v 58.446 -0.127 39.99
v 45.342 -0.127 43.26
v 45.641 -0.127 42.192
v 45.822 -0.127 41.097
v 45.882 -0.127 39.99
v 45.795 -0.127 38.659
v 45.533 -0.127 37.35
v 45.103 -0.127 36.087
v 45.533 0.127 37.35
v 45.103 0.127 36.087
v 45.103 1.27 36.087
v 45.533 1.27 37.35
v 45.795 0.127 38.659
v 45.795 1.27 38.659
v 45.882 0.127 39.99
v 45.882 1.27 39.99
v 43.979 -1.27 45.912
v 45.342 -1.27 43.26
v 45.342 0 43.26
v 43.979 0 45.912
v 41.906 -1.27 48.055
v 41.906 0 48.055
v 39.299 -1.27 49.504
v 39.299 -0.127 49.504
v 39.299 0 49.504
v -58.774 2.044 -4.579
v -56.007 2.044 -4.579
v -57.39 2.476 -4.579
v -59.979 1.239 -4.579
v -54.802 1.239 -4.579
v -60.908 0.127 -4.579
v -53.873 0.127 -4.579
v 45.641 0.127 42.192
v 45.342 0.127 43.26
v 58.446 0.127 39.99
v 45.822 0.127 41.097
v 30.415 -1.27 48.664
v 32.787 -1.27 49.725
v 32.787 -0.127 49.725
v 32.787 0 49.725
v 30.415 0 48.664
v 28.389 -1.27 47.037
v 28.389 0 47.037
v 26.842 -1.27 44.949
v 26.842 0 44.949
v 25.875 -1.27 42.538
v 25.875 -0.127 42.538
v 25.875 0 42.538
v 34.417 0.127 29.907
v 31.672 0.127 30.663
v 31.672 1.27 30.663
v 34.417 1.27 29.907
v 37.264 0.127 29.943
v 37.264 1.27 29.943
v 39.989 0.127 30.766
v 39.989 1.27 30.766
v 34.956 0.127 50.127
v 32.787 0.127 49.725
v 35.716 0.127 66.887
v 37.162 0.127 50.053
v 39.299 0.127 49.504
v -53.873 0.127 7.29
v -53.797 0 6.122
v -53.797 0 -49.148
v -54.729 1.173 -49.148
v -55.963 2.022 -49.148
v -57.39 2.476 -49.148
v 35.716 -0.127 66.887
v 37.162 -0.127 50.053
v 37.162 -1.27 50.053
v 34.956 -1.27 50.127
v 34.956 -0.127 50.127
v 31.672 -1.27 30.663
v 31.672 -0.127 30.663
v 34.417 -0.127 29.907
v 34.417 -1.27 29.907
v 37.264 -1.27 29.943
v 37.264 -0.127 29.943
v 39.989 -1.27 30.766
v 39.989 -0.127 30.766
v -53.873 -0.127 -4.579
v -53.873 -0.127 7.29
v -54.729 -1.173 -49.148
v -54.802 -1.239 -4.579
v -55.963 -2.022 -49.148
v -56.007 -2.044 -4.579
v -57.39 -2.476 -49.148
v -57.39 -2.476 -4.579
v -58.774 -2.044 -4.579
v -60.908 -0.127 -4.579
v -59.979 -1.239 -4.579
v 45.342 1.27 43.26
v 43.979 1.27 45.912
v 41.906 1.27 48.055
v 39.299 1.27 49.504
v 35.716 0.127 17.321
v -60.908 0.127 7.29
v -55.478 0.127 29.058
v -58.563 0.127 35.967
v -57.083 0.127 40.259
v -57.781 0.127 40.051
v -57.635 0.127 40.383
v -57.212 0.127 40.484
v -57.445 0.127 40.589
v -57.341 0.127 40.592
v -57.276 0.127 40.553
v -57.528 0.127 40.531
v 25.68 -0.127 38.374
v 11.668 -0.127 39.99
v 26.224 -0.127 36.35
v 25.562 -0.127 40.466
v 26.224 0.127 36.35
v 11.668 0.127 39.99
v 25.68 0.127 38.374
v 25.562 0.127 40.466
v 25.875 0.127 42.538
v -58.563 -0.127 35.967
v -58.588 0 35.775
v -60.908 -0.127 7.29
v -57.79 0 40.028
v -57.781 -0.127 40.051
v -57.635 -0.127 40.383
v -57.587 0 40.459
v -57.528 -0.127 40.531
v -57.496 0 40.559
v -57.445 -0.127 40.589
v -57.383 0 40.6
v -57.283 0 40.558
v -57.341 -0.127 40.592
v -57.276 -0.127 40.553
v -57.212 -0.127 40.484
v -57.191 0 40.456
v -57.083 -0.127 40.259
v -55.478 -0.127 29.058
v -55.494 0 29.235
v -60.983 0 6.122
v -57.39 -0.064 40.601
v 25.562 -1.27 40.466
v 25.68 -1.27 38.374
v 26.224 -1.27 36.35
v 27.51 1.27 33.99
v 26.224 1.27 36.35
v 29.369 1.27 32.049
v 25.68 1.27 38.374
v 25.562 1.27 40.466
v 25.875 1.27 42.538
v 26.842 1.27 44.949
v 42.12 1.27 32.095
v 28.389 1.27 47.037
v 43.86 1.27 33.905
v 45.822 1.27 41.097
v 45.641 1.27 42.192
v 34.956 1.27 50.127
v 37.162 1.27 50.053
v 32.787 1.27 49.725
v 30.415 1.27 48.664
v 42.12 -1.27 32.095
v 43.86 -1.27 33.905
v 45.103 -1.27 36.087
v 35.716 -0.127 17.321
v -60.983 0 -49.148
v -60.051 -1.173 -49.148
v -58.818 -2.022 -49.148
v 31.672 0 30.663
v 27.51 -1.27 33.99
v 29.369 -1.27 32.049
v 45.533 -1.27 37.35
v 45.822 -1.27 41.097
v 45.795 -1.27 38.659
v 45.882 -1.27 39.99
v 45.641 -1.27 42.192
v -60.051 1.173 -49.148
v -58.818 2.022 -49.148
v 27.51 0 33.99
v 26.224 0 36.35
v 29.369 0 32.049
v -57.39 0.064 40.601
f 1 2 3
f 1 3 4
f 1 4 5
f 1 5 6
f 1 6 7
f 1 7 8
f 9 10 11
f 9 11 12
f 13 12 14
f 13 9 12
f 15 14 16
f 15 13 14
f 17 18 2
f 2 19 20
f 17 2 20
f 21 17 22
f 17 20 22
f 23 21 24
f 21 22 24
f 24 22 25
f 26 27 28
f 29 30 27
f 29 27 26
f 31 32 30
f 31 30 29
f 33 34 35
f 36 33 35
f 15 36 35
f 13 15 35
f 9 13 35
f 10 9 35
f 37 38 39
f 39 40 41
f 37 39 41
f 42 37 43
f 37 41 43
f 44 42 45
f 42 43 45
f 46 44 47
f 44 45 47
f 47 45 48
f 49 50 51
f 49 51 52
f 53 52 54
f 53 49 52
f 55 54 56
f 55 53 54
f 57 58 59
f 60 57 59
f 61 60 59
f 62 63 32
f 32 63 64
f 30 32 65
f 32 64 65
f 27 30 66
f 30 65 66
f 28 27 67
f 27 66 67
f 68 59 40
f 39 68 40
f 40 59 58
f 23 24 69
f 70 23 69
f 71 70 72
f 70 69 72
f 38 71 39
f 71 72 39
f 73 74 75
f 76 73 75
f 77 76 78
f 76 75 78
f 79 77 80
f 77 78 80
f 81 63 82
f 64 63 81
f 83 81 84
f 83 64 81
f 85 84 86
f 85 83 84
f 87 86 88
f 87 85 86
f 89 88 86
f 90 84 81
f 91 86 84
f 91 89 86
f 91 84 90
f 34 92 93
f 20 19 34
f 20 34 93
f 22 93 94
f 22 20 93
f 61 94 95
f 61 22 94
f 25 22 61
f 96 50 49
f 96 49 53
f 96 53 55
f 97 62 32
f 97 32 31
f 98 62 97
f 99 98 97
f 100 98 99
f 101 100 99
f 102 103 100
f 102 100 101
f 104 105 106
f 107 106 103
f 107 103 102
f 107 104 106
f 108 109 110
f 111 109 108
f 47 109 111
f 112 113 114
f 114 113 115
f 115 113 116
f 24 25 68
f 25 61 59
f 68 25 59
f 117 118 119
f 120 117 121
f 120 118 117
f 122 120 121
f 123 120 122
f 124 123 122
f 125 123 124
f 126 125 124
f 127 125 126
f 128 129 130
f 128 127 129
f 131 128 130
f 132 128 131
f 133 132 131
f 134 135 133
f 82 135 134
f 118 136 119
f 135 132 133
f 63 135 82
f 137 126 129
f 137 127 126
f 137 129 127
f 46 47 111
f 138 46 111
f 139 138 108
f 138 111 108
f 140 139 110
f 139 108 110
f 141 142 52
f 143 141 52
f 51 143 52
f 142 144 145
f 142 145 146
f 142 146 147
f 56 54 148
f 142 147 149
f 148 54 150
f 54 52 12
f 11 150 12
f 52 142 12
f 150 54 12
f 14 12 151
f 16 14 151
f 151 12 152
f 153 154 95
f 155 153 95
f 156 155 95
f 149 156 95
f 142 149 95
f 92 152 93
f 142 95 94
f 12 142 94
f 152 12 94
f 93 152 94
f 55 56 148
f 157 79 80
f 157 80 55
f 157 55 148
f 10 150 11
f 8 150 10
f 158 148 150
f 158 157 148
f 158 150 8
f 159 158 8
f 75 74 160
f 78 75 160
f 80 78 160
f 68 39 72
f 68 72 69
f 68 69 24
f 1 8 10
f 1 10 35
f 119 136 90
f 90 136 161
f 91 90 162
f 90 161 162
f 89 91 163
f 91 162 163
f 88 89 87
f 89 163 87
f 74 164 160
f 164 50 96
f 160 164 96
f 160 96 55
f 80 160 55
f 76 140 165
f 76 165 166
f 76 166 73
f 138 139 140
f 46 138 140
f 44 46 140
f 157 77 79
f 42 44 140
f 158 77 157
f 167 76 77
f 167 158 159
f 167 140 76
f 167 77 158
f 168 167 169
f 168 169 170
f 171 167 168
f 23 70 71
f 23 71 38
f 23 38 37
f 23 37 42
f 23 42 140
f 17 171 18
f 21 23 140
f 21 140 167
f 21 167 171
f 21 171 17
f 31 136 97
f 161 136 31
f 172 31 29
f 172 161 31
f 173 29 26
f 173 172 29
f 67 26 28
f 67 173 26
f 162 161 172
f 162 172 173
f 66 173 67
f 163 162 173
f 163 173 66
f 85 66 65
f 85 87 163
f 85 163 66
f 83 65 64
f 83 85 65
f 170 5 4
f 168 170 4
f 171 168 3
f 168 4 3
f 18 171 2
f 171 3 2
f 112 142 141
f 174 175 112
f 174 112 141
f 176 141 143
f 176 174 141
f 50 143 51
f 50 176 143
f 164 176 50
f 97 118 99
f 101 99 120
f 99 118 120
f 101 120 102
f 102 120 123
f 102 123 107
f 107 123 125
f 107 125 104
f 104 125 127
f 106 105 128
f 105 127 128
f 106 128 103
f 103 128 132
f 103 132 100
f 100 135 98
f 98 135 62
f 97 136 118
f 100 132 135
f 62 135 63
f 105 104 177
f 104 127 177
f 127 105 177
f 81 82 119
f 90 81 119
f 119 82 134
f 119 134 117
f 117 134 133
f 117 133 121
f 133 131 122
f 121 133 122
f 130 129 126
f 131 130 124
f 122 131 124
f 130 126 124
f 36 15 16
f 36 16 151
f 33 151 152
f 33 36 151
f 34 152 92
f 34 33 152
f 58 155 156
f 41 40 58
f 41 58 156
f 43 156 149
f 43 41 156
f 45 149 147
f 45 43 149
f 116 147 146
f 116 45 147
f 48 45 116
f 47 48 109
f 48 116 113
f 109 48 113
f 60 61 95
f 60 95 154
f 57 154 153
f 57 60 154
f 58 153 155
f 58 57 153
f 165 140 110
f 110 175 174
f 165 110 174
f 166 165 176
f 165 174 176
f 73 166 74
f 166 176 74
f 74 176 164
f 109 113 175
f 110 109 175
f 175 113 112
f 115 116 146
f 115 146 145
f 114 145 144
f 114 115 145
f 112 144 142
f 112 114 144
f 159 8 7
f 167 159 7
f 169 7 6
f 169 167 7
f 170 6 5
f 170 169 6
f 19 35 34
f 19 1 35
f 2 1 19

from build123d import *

# Parameters (mm, degrees)
F1_DEPTH    = 0.127
F2_DEPTH    = 2.54
F3_T1_DEPTH = 69.9690318011
F5_DEPTH    = 1.27
F6_DEPTH    = 0.127


# Not quite as in the source:
# - a fillet or chamfer that OpenCascade refuses, or shapes differently, is made with other operations: its cross-section is extruded or revolved along the edge and cut away or added


with BuildPart() as f1:
    # F0 (on Front) → F1 (new body, symmetric)
    with BuildSketch(Plane.XZ):
        with BuildLine():
            add(Edge.make_bspline(
                [(-61.6640038788, -4.5790136792), (-60.2394230664, 18.0107697379), (-57.3902614415, 63.190336572), (-54.5410998166, 18.0107697379), (-53.1165190041, -4.5790136792)],
                knots=[0, 0, 0, 0, 0.5, 1, 1, 1, 1], degree=3))
            Line((-61.6640038788, -4.5790136792), (-53.1165190041, -4.5790136792))
        make_face()
    extrude(amount=F1_DEPTH, both=True)

    # F0 (on Front) → F2 (join, symmetric)
    with BuildSketch(Plane.XZ):
        Polygon((-61.6640038788, -4.5790136792), (-53.1165190041, -8.8321231306), (-53.1165190041, -4.5790136792), align=None)
        Polygon((-61.6640038788, -4.5790136792), (-61.6640038788, -12.8659997135), (-53.1165190041, -8.8321231306), align=None)
        Polygon((-61.6640038788, -12.8659997135), (-53.1165190041, -15.6753063202), (-53.1165190041, -8.8321231306), align=None)
        Polygon((-61.6640038788, -12.8659997135), (-61.6640038788, -19.7091810405), (-53.1165190041, -15.6753063202), align=None)
        Polygon((-61.6640038788, -19.7091810405), (-53.1165190041, -23.5269572586), (-53.1165190041, -15.6753063202), align=None)
        Polygon((-61.6640038788, -19.7091810405), (-61.6640038788, -27.4887997657), (-53.1165190041, -23.5269572586), align=None)
        Polygon((-61.6640038788, -27.4887997657), (-53.1165190041, -31.4506441355), (-53.1165190041, -23.5269572586), align=None)
        Polygon((-61.6640038788, -27.4887997657), (-61.6640038788, -37.051204592), (-53.1165190041, -31.4506441355), align=None)
        Polygon((-61.6640038788, -37.051204592), (-53.1165190041, -41.0130489618), (-53.1165190041, -31.4506441355), align=None)
        Polygon((-61.6640038788, -37.051204592), (-61.6640038788, -44.6657761931), (-53.1165190041, -41.0130489618), align=None)
        Polygon((-61.6640038788, -44.6657761931), (-53.1165190041, -49.1480454803), (-53.1165190041, -41.0130489618), align=None)
        Polygon((-61.6640038788, -44.6657761931), (-61.6640038788, -49.1480454803), (-53.1165190041, -49.1480454803), align=None)
    extrude(amount=F2_DEPTH, both=True)

    # F3: fillet of radius 5.08 on 4 edges, made by hand

    # F3_s2 → F3_t1 (cut)
    with BuildSketch(Plane.XY.offset(-61.8480454803)):
        with BuildLine():
            ThreePointArc((-61.6640038788, -2.54), (-60.1761063273, 1.0521024484), (-56.5840038788, 2.54))
            Line((-56.5840038788, 2.54), (-61.6640038788, 2.54))
            Line((-61.6640038788, 2.54), (-61.6640038788, -2.54))
        make_face()
        with BuildLine():
            ThreePointArc((-61.6640038788, 2.54), (-60.1761063273, -1.0521024484), (-56.5840038788, -2.54))
            Line((-56.5840038788, -2.54), (-61.6640038788, -2.54))
            Line((-61.6640038788, -2.54), (-61.6640038788, 2.54))
        make_face()
        with BuildLine():
            ThreePointArc((-53.1165190041, 2.54), (-54.6044165557, -1.0521024484), (-58.1965190041, -2.54))
            Line((-58.1965190041, -2.54), (-53.1165190041, -2.54))
            Line((-53.1165190041, -2.54), (-53.1165190041, 2.54))
        make_face()
        with BuildLine():
            ThreePointArc((-53.1165190041, -2.54), (-54.6044165557, 1.0521024484), (-58.1965190041, 2.54))
            Line((-58.1965190041, 2.54), (-53.1165190041, 2.54))
            Line((-53.1165190041, 2.54), (-53.1165190041, -2.54))
        make_face()
    extrude(amount=F3_T1_DEPTH, mode=Mode.SUBTRACT)


with BuildPart() as f5:
    # F4 (on Front) → F5 (new body, symmetric)
    with BuildSketch(Plane.XZ):
        with BuildLine():
            ThreePointArc((45.1031894134, 36.0872628929), (45.6855333143, 38.000150468), (45.8821839732, 39.9900227785))
            ThreePointArc((45.8821839732, 39.9900227785), (45.7462436924, 41.6469572454), (45.3420584857, 43.2595780645))
            ThreePointArc((45.3420584857, 43.2595780645), (43.0213801023, 47.0597550319), (39.2992154724, 49.5036011011))
            ThreePointArc((39.2992154724, 49.5036011011), (36.0610548886, 50.1500782492), (32.7865184008, 49.7246050309))
            ThreePointArc((32.7865184008, 49.7246050309), (28.3890172345, 47.0367817513), (25.8748064715, 42.5377646665))
            ThreePointArc((25.8748064715, 42.5377646665), (25.566561341, 39.416611169), (26.2243841751, 36.3500359891))
            ThreePointArc((26.2243841751, 36.3500359891), (28.3751844661, 32.9576755169), (31.672057957, 30.6631871971))
            ThreePointArc((31.672057957, 30.6631871971), (35.8417057181, 29.8248929156), (39.9894001299, 30.7658131144))
            ThreePointArc((39.9894001299, 30.7658131144), (43.0462567434, 32.9460861946), (45.1031894134, 36.0872628929))
        make_face()
    extrude(amount=F5_DEPTH, both=True)

    # F4 (on Front) → F6 (join, symmetric)
    with BuildSketch(Plane.XZ):
        with BuildLine():
            ThreePointArc((26.2243841751, 36.3500359891), (25.566561341, 39.416611169), (25.8748064715, 42.5377646665))
            Line((25.8748064715, 42.5377646665), (11.667765677, 39.9900227785))
            Line((11.667765677, 39.9900227785), (26.2243841751, 36.3500359891))
        make_face()
        with BuildLine():
            ThreePointArc((32.7865184008, 49.7246050309), (36.0610548886, 50.1500782492), (39.2992154724, 49.5036011011))
            Line((39.2992154724, 49.5036011011), (35.7162803411, 66.886715591))
            Line((35.7162803411, 66.886715591), (32.7865184008, 49.7246050309))
        make_face()
        with BuildLine():
            Line((35.7162803411, 17.3209942877), (39.9894001299, 30.7658131144))
            ThreePointArc((39.9894001299, 30.7658131144), (35.8417057181, 29.8248929156), (31.672057957, 30.6631871971))
            Line((31.672057957, 30.6631871971), (35.7162803411, 17.3209942877))
        make_face()
        with BuildLine():
            ThreePointArc((45.3420584857, 43.2595780645), (45.7462436924, 41.6469572454), (45.8821839732, 39.9900227785))
            ThreePointArc((45.8821839732, 39.9900227785), (45.6855333143, 38.000150468), (45.1031894134, 36.0872628929))
            Line((45.1031894134, 36.0872628929), (58.4464035928, 39.9900227785))
            Line((58.4464035928, 39.9900227785), (45.3420584857, 43.2595780645))
        make_face()
    extrude(amount=F6_DEPTH, both=True)


solid = Compound([f1.part, f5.part])
